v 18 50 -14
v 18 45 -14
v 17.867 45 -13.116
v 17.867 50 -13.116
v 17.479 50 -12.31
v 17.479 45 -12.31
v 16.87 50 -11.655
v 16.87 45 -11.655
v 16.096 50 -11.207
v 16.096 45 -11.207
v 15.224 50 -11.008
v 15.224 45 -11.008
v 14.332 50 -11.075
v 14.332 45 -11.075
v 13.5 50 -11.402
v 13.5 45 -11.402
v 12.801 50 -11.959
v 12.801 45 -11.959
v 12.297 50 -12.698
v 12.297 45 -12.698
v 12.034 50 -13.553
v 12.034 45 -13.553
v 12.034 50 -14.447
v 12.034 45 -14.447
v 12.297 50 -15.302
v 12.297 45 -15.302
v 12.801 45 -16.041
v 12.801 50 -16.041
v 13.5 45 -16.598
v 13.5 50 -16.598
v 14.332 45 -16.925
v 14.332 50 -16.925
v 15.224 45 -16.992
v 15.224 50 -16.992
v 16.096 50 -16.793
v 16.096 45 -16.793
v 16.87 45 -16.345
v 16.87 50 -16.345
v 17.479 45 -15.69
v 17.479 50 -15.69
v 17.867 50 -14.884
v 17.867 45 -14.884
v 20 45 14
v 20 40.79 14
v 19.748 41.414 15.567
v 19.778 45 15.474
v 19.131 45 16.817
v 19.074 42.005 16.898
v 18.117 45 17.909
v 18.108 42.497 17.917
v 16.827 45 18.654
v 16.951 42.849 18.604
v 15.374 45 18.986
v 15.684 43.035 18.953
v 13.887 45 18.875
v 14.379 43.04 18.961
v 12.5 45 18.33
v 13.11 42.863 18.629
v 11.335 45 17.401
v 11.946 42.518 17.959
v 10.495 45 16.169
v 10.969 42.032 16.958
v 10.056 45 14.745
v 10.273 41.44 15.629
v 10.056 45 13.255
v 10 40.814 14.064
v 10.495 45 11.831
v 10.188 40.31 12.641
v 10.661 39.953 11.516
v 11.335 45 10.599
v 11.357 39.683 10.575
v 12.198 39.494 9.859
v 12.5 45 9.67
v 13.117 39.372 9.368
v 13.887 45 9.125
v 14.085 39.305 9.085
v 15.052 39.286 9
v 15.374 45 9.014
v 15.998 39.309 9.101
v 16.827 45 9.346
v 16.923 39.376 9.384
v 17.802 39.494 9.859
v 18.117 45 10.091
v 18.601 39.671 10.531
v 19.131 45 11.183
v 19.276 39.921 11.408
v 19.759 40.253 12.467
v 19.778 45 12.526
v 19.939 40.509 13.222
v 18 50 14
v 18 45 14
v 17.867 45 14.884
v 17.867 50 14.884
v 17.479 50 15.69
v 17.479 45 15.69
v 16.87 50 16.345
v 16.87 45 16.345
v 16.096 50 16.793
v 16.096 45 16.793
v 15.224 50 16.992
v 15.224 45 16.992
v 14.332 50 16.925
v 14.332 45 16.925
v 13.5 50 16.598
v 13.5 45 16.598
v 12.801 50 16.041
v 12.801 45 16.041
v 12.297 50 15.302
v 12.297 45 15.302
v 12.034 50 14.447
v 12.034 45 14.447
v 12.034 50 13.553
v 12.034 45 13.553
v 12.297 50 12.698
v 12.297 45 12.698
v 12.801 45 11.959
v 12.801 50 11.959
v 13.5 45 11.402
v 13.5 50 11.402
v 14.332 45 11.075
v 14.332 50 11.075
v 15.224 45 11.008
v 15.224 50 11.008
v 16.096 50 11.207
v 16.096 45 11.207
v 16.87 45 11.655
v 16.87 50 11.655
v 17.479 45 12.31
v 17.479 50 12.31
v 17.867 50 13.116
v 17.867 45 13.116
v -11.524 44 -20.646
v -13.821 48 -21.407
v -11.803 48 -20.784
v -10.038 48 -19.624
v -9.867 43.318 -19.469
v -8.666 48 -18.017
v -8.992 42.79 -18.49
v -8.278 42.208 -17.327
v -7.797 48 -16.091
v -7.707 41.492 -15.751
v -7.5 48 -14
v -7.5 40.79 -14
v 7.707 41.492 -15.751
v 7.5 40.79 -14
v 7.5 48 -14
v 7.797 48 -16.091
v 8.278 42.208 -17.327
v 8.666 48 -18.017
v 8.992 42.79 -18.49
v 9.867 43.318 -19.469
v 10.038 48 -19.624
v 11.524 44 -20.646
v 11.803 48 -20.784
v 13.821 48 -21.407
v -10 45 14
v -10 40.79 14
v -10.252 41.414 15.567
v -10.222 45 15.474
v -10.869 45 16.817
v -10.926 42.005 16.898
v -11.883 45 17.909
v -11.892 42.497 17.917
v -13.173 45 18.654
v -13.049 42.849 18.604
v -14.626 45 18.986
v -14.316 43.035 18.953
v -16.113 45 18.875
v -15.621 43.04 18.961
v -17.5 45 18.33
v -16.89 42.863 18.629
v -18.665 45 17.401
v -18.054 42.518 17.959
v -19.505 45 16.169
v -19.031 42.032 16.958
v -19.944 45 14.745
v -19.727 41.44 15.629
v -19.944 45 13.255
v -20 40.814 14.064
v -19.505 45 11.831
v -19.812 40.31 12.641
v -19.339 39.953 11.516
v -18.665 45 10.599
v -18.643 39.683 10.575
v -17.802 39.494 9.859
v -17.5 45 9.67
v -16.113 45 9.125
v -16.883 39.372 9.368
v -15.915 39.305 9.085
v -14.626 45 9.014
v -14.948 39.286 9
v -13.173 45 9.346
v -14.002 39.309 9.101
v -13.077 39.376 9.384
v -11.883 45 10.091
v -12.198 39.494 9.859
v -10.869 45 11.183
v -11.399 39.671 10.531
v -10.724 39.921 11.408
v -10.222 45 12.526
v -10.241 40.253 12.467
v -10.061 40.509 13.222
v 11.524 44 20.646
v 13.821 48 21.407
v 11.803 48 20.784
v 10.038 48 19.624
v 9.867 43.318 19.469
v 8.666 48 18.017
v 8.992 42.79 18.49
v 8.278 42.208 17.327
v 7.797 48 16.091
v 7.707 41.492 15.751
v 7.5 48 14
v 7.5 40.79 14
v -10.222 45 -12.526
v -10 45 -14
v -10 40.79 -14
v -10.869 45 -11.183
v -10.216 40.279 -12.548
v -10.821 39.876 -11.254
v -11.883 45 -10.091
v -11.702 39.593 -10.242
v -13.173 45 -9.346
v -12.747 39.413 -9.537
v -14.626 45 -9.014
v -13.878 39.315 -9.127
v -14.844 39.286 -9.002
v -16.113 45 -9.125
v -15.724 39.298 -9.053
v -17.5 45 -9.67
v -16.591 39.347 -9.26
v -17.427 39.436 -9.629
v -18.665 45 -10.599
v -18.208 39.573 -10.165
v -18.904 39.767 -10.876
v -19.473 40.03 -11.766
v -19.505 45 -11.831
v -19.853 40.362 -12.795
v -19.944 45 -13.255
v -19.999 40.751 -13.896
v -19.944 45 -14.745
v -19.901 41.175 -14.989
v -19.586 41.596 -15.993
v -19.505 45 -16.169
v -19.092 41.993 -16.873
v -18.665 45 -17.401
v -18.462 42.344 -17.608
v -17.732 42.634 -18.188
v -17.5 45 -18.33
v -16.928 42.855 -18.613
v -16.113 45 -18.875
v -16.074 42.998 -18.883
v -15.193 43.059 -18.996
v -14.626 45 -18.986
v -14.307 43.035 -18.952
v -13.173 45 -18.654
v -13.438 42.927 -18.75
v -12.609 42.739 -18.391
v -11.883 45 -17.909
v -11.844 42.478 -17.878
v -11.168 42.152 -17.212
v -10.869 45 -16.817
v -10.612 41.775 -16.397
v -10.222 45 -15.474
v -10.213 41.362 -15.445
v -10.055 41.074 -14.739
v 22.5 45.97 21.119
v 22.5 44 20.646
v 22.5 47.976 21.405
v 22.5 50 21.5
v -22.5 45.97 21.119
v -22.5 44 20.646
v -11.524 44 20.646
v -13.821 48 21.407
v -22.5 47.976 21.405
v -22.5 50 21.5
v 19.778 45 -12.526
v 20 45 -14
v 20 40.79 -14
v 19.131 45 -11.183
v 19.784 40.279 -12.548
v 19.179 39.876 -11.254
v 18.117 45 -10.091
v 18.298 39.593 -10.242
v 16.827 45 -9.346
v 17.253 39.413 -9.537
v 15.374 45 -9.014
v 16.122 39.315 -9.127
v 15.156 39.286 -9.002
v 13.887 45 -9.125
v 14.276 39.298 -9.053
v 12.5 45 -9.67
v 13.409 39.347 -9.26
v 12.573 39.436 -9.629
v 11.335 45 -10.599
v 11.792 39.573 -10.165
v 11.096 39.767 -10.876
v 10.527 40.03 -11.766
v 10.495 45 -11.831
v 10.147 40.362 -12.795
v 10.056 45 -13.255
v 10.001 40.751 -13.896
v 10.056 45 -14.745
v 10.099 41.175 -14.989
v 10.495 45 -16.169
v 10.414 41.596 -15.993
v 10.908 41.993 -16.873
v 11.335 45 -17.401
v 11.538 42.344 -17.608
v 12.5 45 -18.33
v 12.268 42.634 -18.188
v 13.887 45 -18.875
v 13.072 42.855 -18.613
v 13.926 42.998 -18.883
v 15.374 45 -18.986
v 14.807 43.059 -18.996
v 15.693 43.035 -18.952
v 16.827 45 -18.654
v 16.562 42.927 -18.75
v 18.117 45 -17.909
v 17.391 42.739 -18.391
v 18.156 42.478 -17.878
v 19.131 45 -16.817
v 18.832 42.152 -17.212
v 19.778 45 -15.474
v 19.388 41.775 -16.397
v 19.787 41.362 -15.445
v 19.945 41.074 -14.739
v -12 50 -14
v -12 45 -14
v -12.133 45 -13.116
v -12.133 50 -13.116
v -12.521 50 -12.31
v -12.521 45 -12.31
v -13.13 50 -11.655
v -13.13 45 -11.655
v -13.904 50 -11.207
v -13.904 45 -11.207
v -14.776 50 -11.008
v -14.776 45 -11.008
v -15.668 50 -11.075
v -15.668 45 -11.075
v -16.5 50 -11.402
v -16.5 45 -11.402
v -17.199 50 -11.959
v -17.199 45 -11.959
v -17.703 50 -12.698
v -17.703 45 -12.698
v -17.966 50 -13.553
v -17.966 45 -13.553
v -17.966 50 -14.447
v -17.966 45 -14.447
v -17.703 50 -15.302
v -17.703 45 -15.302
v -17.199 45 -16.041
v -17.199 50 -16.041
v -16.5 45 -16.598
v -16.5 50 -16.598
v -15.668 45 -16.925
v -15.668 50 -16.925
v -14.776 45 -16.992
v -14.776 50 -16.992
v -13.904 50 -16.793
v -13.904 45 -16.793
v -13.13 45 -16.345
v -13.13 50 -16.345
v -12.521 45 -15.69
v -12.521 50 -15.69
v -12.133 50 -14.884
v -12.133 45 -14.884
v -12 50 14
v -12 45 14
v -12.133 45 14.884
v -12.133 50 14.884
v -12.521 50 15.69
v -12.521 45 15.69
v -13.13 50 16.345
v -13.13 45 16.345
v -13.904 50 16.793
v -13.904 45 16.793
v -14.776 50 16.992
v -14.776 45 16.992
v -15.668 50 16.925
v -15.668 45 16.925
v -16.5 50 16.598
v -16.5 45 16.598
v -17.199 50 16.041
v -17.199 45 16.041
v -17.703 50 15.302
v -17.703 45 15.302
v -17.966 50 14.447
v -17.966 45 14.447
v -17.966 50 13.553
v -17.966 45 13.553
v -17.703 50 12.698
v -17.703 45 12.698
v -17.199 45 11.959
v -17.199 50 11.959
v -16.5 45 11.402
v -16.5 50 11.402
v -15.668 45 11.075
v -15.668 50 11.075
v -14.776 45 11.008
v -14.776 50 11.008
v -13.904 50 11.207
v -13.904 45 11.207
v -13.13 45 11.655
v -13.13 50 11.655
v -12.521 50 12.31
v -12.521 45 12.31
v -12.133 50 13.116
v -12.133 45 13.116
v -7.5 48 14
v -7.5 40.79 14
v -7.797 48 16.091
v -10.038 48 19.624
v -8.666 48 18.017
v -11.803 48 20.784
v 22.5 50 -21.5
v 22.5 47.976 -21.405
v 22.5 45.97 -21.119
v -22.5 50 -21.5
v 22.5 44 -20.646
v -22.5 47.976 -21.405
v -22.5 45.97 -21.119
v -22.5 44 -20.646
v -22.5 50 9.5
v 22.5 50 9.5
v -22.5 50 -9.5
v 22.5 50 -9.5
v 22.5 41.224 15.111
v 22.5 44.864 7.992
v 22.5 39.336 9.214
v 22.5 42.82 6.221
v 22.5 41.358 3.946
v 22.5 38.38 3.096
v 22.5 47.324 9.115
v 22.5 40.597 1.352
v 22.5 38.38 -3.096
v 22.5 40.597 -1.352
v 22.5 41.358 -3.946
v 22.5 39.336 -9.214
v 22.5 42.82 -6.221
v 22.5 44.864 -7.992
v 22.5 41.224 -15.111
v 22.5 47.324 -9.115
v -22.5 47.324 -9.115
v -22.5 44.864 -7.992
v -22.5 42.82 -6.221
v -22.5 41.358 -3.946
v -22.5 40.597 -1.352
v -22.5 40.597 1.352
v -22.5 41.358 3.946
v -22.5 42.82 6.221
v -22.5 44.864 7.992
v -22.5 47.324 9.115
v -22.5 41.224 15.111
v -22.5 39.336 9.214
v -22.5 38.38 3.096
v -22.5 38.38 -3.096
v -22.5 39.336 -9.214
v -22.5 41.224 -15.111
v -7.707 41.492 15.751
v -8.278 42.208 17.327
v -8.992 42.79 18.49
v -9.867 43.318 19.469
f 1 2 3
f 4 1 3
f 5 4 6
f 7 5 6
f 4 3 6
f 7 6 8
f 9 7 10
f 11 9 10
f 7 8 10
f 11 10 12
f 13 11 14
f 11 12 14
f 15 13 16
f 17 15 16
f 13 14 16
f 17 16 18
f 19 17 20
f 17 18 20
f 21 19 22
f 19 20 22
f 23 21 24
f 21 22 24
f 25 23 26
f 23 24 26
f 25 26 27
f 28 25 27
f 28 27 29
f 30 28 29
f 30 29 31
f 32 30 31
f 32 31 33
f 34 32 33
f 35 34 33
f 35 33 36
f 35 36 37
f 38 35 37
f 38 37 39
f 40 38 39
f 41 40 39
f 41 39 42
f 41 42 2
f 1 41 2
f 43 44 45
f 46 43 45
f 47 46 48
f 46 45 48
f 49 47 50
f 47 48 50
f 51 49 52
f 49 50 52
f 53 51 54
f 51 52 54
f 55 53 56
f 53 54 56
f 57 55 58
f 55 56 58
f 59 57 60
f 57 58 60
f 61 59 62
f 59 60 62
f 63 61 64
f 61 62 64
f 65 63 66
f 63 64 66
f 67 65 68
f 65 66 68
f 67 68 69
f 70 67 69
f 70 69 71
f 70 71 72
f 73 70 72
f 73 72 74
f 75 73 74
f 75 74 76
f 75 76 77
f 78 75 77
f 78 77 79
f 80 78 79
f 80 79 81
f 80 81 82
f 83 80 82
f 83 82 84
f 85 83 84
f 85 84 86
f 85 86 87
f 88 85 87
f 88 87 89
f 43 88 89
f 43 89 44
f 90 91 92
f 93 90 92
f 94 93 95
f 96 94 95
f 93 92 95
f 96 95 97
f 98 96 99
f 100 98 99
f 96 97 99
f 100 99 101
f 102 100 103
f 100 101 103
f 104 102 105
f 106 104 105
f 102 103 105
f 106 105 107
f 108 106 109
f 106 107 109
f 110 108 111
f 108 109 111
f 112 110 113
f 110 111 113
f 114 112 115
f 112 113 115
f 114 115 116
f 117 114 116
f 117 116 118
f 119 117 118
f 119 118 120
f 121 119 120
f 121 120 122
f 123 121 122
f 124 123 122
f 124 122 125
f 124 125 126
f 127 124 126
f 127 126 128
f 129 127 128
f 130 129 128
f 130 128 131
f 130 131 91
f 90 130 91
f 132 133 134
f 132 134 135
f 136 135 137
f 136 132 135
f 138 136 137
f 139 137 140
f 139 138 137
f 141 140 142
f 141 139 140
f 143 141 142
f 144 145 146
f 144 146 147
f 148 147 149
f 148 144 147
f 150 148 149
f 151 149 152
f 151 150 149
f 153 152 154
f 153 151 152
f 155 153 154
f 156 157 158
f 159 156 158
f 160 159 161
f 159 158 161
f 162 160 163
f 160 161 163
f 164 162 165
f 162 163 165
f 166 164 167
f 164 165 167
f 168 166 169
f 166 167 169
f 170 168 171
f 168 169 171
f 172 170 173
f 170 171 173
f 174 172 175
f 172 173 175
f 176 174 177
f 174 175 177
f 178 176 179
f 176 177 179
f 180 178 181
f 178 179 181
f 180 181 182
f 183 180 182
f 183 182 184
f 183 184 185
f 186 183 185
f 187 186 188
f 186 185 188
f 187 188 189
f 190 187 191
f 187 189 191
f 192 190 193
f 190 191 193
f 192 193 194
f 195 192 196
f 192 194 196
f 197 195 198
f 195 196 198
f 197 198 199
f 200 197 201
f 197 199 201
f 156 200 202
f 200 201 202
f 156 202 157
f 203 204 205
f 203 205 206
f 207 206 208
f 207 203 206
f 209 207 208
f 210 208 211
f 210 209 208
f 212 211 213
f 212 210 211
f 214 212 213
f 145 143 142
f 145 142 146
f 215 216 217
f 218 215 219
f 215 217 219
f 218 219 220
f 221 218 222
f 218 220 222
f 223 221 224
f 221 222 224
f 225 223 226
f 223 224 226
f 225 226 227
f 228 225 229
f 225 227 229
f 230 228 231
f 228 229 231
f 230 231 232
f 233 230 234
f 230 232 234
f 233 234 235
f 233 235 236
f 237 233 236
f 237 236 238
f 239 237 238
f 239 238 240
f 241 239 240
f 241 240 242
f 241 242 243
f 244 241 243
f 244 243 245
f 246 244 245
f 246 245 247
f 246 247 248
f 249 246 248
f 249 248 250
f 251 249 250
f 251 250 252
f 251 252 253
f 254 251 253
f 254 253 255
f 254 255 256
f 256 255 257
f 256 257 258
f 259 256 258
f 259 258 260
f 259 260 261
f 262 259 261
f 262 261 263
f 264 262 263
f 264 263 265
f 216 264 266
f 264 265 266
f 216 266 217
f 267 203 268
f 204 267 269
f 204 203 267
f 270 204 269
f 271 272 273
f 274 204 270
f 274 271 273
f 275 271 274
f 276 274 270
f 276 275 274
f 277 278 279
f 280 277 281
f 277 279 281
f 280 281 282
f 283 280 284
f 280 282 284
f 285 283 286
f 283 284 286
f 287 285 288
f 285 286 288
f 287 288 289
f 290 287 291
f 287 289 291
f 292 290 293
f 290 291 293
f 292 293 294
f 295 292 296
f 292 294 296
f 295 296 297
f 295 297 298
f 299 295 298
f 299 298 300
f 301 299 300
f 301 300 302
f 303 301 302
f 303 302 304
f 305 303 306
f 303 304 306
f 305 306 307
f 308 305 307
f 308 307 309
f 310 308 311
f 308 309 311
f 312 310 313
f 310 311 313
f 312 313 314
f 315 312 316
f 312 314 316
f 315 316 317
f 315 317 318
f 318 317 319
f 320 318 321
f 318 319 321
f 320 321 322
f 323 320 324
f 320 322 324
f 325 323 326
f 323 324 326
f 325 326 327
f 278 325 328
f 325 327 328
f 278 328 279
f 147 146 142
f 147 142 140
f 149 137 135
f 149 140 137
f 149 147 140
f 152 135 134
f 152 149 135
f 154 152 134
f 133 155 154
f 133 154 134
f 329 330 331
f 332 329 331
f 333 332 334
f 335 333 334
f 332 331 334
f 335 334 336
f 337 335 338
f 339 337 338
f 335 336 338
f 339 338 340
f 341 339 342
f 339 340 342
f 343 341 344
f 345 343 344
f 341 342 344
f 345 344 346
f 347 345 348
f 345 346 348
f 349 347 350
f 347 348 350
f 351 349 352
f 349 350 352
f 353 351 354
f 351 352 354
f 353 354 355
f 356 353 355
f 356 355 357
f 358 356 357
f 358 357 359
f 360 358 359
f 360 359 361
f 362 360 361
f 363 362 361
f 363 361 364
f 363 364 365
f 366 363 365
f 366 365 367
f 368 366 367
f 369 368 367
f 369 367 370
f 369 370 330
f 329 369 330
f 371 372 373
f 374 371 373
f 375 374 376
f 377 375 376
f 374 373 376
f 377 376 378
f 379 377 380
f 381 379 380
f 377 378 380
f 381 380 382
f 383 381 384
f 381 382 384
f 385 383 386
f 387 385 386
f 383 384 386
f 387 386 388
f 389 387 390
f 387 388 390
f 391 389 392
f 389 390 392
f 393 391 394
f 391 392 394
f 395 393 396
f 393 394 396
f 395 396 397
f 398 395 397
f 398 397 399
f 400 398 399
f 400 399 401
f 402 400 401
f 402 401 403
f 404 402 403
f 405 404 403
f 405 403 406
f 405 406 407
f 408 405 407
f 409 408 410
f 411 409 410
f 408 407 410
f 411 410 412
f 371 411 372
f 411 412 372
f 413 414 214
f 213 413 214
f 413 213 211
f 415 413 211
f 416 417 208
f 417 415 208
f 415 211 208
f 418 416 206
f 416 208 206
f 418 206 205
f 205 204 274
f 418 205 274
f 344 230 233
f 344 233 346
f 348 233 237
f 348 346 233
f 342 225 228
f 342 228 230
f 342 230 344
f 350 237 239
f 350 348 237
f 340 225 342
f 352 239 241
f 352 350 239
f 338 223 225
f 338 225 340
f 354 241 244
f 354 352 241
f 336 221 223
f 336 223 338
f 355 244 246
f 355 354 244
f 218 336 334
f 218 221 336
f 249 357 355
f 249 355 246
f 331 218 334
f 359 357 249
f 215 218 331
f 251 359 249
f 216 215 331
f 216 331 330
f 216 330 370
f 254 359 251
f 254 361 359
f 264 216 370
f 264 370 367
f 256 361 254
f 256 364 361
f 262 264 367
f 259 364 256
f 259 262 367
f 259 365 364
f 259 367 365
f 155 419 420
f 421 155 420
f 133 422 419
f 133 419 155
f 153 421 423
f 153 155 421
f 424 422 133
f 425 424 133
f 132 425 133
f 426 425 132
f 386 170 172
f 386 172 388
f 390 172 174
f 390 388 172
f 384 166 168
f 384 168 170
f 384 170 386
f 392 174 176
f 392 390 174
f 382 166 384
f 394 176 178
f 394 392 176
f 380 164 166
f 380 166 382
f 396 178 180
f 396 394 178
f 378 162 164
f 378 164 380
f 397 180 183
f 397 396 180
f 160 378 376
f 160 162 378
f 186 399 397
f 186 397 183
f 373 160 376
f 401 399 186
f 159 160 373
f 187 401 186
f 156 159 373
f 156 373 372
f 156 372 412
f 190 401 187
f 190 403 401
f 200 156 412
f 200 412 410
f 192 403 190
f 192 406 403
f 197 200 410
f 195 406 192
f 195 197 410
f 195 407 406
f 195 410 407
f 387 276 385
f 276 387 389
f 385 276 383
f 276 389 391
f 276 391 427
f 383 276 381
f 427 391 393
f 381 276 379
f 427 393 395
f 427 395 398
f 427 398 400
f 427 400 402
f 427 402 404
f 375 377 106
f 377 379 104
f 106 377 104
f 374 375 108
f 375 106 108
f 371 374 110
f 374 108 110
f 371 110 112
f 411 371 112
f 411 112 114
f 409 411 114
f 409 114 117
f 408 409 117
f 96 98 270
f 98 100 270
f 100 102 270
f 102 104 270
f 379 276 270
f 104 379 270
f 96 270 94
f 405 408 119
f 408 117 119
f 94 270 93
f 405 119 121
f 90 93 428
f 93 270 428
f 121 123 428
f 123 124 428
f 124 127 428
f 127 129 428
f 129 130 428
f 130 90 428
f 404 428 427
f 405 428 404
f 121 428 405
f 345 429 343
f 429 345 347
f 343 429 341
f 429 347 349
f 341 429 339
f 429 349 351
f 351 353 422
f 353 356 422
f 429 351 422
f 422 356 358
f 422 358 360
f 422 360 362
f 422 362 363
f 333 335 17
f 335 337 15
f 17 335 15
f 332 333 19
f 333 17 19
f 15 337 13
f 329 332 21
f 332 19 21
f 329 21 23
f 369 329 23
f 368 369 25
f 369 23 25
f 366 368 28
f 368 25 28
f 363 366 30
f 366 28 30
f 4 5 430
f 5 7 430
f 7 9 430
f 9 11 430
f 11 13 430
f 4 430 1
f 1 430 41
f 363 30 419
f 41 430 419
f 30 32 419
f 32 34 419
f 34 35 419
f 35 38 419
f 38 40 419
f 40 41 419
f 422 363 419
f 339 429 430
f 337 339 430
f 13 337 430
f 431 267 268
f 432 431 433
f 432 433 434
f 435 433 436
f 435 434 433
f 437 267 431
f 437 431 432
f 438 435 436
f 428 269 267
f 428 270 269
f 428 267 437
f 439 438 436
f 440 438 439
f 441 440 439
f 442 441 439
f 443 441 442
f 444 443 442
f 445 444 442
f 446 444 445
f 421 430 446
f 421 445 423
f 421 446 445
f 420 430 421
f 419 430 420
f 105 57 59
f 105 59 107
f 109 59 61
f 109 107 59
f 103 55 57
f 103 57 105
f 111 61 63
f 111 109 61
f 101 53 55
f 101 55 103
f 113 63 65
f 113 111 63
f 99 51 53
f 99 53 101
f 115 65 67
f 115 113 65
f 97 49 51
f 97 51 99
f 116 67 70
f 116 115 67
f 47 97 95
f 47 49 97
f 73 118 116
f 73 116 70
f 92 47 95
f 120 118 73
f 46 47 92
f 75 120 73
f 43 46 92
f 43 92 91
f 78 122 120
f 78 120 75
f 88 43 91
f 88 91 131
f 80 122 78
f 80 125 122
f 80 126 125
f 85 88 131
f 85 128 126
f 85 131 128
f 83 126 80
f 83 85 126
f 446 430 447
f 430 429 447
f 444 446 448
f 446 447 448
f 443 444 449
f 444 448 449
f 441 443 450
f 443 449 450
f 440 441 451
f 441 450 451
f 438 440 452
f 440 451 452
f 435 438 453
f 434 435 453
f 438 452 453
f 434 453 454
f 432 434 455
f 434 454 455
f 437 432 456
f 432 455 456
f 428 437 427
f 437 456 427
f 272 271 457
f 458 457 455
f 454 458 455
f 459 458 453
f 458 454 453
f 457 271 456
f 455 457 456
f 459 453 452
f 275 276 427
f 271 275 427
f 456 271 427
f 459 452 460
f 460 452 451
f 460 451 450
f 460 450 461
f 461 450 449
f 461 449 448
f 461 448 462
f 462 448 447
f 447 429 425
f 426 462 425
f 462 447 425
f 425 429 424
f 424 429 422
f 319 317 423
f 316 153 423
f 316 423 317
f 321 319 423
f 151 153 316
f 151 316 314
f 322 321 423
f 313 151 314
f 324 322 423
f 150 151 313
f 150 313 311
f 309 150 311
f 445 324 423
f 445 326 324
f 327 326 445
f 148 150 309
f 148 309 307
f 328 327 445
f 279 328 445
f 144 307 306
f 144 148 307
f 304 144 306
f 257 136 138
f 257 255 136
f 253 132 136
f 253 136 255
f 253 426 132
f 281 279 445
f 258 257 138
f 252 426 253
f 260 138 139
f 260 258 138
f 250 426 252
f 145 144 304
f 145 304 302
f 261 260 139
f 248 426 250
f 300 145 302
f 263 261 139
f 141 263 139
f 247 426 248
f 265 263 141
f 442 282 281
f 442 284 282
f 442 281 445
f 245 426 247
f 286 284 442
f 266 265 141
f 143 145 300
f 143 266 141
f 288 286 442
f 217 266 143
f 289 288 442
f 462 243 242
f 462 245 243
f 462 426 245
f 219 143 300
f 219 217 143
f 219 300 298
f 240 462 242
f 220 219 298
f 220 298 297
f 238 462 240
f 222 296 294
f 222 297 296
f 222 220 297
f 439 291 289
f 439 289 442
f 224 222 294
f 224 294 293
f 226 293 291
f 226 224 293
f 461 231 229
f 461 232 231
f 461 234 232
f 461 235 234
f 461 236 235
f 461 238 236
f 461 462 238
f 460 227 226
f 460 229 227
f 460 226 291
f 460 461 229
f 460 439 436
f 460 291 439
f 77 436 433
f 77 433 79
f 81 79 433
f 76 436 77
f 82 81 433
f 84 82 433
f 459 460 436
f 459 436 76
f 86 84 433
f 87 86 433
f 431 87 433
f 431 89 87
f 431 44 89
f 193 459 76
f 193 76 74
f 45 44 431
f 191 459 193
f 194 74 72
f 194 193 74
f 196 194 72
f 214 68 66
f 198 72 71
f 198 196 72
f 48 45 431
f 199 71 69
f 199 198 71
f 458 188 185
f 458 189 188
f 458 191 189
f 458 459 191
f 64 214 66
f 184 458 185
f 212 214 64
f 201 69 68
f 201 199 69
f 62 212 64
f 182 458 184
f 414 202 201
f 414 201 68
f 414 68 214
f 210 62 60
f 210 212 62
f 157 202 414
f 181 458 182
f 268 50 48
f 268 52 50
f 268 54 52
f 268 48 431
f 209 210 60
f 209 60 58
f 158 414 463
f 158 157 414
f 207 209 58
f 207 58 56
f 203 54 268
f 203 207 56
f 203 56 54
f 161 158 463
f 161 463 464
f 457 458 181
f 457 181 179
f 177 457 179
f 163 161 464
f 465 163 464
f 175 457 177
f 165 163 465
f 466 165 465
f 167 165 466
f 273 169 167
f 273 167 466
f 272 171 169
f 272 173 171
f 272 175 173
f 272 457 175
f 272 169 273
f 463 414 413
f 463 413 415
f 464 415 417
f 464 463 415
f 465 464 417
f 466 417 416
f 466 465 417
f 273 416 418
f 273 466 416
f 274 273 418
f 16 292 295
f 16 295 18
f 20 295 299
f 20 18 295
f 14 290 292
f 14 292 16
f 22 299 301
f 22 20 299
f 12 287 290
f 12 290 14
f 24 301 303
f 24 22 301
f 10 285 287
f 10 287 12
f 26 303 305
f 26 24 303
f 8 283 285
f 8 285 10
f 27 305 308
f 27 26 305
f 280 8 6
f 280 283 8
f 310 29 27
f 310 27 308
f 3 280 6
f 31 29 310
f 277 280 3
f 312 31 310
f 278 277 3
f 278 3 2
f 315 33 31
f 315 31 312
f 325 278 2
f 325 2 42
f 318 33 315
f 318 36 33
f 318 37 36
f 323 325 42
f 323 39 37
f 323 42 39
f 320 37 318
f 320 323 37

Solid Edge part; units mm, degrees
sketch "Sketch1" plane through (0, 50, 11.75) normal (0, -1, 0) x (1, 0, 0)
  line L0 (-22.5, -33.25) -> (22.5, -33.25)
  line L1 (22.5, 9.75) -> (22.5, -33.25)
  line L2 (22.5, 9.75) -> (-22.5, 9.75)
  line L3 (-22.5, 9.75) -> (-22.5, -33.25)
  dimension "D1" = 45
  dimension "D2" = 43
extrude "ExtrudedProtrusion_2" add sketch "Sketch1" along normal blind 12
sketch "Sketch2" plane through (0, 0, 0) normal (1, 0, 0) x (0, 1, 0)
  arc A0 (50, -9.5) -> (50, 9.5) centre (50, 0) cw
  line L0 (50, 9.5) -> (50, -9.5)
  dimension "D1" = 9.5
  dimension "D2" = 19
extrude "Cutout1" cut sketch "Sketch2" along normal through all and the other way through all
sketch "Sketch3" plane through (-22.5, 44, 0) normal (-1, 0, 0) x (0, 0, -1)
  arc A0 (20.6458, 0) -> (21.5, -6) centre (0, -6) cw
  line L0 (27.9876, -6) -> (21.5, -6)
  line L1 (27.9876, 18.1819) -> (27.9876, -6)
  line L2 (-27.4197, 18.1819) -> (27.9876, 18.1819)
  line L3 (-27.4197, -6) -> (-27.4197, 18.1819)
  line L4 (-21.5, -6) -> (-27.4197, -6)
  arc A1 (-21.5, -6) -> (-20.6458, 0) centre (0, -6) cw
  arc A2 (-20.6458, 0) -> (20.6458, 0) centre (0, -34.26) cw
  dimension "D1" = 6
  dimension "D2" = 40
extrude "Cutout2" cut sketch "Sketch3" against normal up to next
sketch "Sketch4" plane through (0, 38, 0) normal (0, -1, 0) x (1, 0, 0)
  circle A0 centre (-15, 14) radius 3
  circle A1 centre (15, 14) radius 3
  circle A2 centre (-15, -14) radius 3
  circle A3 centre (15, -14) radius 3
  dimension "D1" = 6
  dimension "D2" = 7.5
  dimension "D3" = 30
  dimension "D4" = 15
extrude "Cutout3" cut sketch "Sketch4" against normal through all
sketch "Sketch5" plane through (0, 38, 0) normal (0, -1, 0) x (1, 0, 0)
  circle A0 centre (-15, 14) radius 5
  circle A1 centre (15, 14) radius 5
  circle A2 centre (15, -14) radius 5
  circle A3 centre (-15, -14) radius 5
  dimension "D1" = 10
extrude "Cutout4" cut sketch "Sketch5" against normal blind 7
sketch "Sketch6" plane through (0, 38, 0) normal (0, -1, 0) x (1, 0, 0)
  arc A0 (15, 21.5) -> (7.5, 14) centre (15, 14) ccw
  line L0 (-7.5, 14) -> (7.5, 14)
  arc A1 (-15, 21.5) -> (-7.5, 14) centre (-15, 14) cw
  line L1 (-15, 21.5) -> (15, 21.5)
  arc A2 (15, -21.5) -> (7.5, -14) centre (15, -14) cw
  line L2 (-7.5, -14) -> (7.5, -14)
  arc A3 (-15, -21.5) -> (-7.5, -14) centre (-15, -14) ccw
  line L3 (-15, -21.5) -> (15, -21.5)
extrude "ExtrudedCutout_9" cut sketch "Sketch6" against normal blind 10
properties material "Aluminum, 1060"
